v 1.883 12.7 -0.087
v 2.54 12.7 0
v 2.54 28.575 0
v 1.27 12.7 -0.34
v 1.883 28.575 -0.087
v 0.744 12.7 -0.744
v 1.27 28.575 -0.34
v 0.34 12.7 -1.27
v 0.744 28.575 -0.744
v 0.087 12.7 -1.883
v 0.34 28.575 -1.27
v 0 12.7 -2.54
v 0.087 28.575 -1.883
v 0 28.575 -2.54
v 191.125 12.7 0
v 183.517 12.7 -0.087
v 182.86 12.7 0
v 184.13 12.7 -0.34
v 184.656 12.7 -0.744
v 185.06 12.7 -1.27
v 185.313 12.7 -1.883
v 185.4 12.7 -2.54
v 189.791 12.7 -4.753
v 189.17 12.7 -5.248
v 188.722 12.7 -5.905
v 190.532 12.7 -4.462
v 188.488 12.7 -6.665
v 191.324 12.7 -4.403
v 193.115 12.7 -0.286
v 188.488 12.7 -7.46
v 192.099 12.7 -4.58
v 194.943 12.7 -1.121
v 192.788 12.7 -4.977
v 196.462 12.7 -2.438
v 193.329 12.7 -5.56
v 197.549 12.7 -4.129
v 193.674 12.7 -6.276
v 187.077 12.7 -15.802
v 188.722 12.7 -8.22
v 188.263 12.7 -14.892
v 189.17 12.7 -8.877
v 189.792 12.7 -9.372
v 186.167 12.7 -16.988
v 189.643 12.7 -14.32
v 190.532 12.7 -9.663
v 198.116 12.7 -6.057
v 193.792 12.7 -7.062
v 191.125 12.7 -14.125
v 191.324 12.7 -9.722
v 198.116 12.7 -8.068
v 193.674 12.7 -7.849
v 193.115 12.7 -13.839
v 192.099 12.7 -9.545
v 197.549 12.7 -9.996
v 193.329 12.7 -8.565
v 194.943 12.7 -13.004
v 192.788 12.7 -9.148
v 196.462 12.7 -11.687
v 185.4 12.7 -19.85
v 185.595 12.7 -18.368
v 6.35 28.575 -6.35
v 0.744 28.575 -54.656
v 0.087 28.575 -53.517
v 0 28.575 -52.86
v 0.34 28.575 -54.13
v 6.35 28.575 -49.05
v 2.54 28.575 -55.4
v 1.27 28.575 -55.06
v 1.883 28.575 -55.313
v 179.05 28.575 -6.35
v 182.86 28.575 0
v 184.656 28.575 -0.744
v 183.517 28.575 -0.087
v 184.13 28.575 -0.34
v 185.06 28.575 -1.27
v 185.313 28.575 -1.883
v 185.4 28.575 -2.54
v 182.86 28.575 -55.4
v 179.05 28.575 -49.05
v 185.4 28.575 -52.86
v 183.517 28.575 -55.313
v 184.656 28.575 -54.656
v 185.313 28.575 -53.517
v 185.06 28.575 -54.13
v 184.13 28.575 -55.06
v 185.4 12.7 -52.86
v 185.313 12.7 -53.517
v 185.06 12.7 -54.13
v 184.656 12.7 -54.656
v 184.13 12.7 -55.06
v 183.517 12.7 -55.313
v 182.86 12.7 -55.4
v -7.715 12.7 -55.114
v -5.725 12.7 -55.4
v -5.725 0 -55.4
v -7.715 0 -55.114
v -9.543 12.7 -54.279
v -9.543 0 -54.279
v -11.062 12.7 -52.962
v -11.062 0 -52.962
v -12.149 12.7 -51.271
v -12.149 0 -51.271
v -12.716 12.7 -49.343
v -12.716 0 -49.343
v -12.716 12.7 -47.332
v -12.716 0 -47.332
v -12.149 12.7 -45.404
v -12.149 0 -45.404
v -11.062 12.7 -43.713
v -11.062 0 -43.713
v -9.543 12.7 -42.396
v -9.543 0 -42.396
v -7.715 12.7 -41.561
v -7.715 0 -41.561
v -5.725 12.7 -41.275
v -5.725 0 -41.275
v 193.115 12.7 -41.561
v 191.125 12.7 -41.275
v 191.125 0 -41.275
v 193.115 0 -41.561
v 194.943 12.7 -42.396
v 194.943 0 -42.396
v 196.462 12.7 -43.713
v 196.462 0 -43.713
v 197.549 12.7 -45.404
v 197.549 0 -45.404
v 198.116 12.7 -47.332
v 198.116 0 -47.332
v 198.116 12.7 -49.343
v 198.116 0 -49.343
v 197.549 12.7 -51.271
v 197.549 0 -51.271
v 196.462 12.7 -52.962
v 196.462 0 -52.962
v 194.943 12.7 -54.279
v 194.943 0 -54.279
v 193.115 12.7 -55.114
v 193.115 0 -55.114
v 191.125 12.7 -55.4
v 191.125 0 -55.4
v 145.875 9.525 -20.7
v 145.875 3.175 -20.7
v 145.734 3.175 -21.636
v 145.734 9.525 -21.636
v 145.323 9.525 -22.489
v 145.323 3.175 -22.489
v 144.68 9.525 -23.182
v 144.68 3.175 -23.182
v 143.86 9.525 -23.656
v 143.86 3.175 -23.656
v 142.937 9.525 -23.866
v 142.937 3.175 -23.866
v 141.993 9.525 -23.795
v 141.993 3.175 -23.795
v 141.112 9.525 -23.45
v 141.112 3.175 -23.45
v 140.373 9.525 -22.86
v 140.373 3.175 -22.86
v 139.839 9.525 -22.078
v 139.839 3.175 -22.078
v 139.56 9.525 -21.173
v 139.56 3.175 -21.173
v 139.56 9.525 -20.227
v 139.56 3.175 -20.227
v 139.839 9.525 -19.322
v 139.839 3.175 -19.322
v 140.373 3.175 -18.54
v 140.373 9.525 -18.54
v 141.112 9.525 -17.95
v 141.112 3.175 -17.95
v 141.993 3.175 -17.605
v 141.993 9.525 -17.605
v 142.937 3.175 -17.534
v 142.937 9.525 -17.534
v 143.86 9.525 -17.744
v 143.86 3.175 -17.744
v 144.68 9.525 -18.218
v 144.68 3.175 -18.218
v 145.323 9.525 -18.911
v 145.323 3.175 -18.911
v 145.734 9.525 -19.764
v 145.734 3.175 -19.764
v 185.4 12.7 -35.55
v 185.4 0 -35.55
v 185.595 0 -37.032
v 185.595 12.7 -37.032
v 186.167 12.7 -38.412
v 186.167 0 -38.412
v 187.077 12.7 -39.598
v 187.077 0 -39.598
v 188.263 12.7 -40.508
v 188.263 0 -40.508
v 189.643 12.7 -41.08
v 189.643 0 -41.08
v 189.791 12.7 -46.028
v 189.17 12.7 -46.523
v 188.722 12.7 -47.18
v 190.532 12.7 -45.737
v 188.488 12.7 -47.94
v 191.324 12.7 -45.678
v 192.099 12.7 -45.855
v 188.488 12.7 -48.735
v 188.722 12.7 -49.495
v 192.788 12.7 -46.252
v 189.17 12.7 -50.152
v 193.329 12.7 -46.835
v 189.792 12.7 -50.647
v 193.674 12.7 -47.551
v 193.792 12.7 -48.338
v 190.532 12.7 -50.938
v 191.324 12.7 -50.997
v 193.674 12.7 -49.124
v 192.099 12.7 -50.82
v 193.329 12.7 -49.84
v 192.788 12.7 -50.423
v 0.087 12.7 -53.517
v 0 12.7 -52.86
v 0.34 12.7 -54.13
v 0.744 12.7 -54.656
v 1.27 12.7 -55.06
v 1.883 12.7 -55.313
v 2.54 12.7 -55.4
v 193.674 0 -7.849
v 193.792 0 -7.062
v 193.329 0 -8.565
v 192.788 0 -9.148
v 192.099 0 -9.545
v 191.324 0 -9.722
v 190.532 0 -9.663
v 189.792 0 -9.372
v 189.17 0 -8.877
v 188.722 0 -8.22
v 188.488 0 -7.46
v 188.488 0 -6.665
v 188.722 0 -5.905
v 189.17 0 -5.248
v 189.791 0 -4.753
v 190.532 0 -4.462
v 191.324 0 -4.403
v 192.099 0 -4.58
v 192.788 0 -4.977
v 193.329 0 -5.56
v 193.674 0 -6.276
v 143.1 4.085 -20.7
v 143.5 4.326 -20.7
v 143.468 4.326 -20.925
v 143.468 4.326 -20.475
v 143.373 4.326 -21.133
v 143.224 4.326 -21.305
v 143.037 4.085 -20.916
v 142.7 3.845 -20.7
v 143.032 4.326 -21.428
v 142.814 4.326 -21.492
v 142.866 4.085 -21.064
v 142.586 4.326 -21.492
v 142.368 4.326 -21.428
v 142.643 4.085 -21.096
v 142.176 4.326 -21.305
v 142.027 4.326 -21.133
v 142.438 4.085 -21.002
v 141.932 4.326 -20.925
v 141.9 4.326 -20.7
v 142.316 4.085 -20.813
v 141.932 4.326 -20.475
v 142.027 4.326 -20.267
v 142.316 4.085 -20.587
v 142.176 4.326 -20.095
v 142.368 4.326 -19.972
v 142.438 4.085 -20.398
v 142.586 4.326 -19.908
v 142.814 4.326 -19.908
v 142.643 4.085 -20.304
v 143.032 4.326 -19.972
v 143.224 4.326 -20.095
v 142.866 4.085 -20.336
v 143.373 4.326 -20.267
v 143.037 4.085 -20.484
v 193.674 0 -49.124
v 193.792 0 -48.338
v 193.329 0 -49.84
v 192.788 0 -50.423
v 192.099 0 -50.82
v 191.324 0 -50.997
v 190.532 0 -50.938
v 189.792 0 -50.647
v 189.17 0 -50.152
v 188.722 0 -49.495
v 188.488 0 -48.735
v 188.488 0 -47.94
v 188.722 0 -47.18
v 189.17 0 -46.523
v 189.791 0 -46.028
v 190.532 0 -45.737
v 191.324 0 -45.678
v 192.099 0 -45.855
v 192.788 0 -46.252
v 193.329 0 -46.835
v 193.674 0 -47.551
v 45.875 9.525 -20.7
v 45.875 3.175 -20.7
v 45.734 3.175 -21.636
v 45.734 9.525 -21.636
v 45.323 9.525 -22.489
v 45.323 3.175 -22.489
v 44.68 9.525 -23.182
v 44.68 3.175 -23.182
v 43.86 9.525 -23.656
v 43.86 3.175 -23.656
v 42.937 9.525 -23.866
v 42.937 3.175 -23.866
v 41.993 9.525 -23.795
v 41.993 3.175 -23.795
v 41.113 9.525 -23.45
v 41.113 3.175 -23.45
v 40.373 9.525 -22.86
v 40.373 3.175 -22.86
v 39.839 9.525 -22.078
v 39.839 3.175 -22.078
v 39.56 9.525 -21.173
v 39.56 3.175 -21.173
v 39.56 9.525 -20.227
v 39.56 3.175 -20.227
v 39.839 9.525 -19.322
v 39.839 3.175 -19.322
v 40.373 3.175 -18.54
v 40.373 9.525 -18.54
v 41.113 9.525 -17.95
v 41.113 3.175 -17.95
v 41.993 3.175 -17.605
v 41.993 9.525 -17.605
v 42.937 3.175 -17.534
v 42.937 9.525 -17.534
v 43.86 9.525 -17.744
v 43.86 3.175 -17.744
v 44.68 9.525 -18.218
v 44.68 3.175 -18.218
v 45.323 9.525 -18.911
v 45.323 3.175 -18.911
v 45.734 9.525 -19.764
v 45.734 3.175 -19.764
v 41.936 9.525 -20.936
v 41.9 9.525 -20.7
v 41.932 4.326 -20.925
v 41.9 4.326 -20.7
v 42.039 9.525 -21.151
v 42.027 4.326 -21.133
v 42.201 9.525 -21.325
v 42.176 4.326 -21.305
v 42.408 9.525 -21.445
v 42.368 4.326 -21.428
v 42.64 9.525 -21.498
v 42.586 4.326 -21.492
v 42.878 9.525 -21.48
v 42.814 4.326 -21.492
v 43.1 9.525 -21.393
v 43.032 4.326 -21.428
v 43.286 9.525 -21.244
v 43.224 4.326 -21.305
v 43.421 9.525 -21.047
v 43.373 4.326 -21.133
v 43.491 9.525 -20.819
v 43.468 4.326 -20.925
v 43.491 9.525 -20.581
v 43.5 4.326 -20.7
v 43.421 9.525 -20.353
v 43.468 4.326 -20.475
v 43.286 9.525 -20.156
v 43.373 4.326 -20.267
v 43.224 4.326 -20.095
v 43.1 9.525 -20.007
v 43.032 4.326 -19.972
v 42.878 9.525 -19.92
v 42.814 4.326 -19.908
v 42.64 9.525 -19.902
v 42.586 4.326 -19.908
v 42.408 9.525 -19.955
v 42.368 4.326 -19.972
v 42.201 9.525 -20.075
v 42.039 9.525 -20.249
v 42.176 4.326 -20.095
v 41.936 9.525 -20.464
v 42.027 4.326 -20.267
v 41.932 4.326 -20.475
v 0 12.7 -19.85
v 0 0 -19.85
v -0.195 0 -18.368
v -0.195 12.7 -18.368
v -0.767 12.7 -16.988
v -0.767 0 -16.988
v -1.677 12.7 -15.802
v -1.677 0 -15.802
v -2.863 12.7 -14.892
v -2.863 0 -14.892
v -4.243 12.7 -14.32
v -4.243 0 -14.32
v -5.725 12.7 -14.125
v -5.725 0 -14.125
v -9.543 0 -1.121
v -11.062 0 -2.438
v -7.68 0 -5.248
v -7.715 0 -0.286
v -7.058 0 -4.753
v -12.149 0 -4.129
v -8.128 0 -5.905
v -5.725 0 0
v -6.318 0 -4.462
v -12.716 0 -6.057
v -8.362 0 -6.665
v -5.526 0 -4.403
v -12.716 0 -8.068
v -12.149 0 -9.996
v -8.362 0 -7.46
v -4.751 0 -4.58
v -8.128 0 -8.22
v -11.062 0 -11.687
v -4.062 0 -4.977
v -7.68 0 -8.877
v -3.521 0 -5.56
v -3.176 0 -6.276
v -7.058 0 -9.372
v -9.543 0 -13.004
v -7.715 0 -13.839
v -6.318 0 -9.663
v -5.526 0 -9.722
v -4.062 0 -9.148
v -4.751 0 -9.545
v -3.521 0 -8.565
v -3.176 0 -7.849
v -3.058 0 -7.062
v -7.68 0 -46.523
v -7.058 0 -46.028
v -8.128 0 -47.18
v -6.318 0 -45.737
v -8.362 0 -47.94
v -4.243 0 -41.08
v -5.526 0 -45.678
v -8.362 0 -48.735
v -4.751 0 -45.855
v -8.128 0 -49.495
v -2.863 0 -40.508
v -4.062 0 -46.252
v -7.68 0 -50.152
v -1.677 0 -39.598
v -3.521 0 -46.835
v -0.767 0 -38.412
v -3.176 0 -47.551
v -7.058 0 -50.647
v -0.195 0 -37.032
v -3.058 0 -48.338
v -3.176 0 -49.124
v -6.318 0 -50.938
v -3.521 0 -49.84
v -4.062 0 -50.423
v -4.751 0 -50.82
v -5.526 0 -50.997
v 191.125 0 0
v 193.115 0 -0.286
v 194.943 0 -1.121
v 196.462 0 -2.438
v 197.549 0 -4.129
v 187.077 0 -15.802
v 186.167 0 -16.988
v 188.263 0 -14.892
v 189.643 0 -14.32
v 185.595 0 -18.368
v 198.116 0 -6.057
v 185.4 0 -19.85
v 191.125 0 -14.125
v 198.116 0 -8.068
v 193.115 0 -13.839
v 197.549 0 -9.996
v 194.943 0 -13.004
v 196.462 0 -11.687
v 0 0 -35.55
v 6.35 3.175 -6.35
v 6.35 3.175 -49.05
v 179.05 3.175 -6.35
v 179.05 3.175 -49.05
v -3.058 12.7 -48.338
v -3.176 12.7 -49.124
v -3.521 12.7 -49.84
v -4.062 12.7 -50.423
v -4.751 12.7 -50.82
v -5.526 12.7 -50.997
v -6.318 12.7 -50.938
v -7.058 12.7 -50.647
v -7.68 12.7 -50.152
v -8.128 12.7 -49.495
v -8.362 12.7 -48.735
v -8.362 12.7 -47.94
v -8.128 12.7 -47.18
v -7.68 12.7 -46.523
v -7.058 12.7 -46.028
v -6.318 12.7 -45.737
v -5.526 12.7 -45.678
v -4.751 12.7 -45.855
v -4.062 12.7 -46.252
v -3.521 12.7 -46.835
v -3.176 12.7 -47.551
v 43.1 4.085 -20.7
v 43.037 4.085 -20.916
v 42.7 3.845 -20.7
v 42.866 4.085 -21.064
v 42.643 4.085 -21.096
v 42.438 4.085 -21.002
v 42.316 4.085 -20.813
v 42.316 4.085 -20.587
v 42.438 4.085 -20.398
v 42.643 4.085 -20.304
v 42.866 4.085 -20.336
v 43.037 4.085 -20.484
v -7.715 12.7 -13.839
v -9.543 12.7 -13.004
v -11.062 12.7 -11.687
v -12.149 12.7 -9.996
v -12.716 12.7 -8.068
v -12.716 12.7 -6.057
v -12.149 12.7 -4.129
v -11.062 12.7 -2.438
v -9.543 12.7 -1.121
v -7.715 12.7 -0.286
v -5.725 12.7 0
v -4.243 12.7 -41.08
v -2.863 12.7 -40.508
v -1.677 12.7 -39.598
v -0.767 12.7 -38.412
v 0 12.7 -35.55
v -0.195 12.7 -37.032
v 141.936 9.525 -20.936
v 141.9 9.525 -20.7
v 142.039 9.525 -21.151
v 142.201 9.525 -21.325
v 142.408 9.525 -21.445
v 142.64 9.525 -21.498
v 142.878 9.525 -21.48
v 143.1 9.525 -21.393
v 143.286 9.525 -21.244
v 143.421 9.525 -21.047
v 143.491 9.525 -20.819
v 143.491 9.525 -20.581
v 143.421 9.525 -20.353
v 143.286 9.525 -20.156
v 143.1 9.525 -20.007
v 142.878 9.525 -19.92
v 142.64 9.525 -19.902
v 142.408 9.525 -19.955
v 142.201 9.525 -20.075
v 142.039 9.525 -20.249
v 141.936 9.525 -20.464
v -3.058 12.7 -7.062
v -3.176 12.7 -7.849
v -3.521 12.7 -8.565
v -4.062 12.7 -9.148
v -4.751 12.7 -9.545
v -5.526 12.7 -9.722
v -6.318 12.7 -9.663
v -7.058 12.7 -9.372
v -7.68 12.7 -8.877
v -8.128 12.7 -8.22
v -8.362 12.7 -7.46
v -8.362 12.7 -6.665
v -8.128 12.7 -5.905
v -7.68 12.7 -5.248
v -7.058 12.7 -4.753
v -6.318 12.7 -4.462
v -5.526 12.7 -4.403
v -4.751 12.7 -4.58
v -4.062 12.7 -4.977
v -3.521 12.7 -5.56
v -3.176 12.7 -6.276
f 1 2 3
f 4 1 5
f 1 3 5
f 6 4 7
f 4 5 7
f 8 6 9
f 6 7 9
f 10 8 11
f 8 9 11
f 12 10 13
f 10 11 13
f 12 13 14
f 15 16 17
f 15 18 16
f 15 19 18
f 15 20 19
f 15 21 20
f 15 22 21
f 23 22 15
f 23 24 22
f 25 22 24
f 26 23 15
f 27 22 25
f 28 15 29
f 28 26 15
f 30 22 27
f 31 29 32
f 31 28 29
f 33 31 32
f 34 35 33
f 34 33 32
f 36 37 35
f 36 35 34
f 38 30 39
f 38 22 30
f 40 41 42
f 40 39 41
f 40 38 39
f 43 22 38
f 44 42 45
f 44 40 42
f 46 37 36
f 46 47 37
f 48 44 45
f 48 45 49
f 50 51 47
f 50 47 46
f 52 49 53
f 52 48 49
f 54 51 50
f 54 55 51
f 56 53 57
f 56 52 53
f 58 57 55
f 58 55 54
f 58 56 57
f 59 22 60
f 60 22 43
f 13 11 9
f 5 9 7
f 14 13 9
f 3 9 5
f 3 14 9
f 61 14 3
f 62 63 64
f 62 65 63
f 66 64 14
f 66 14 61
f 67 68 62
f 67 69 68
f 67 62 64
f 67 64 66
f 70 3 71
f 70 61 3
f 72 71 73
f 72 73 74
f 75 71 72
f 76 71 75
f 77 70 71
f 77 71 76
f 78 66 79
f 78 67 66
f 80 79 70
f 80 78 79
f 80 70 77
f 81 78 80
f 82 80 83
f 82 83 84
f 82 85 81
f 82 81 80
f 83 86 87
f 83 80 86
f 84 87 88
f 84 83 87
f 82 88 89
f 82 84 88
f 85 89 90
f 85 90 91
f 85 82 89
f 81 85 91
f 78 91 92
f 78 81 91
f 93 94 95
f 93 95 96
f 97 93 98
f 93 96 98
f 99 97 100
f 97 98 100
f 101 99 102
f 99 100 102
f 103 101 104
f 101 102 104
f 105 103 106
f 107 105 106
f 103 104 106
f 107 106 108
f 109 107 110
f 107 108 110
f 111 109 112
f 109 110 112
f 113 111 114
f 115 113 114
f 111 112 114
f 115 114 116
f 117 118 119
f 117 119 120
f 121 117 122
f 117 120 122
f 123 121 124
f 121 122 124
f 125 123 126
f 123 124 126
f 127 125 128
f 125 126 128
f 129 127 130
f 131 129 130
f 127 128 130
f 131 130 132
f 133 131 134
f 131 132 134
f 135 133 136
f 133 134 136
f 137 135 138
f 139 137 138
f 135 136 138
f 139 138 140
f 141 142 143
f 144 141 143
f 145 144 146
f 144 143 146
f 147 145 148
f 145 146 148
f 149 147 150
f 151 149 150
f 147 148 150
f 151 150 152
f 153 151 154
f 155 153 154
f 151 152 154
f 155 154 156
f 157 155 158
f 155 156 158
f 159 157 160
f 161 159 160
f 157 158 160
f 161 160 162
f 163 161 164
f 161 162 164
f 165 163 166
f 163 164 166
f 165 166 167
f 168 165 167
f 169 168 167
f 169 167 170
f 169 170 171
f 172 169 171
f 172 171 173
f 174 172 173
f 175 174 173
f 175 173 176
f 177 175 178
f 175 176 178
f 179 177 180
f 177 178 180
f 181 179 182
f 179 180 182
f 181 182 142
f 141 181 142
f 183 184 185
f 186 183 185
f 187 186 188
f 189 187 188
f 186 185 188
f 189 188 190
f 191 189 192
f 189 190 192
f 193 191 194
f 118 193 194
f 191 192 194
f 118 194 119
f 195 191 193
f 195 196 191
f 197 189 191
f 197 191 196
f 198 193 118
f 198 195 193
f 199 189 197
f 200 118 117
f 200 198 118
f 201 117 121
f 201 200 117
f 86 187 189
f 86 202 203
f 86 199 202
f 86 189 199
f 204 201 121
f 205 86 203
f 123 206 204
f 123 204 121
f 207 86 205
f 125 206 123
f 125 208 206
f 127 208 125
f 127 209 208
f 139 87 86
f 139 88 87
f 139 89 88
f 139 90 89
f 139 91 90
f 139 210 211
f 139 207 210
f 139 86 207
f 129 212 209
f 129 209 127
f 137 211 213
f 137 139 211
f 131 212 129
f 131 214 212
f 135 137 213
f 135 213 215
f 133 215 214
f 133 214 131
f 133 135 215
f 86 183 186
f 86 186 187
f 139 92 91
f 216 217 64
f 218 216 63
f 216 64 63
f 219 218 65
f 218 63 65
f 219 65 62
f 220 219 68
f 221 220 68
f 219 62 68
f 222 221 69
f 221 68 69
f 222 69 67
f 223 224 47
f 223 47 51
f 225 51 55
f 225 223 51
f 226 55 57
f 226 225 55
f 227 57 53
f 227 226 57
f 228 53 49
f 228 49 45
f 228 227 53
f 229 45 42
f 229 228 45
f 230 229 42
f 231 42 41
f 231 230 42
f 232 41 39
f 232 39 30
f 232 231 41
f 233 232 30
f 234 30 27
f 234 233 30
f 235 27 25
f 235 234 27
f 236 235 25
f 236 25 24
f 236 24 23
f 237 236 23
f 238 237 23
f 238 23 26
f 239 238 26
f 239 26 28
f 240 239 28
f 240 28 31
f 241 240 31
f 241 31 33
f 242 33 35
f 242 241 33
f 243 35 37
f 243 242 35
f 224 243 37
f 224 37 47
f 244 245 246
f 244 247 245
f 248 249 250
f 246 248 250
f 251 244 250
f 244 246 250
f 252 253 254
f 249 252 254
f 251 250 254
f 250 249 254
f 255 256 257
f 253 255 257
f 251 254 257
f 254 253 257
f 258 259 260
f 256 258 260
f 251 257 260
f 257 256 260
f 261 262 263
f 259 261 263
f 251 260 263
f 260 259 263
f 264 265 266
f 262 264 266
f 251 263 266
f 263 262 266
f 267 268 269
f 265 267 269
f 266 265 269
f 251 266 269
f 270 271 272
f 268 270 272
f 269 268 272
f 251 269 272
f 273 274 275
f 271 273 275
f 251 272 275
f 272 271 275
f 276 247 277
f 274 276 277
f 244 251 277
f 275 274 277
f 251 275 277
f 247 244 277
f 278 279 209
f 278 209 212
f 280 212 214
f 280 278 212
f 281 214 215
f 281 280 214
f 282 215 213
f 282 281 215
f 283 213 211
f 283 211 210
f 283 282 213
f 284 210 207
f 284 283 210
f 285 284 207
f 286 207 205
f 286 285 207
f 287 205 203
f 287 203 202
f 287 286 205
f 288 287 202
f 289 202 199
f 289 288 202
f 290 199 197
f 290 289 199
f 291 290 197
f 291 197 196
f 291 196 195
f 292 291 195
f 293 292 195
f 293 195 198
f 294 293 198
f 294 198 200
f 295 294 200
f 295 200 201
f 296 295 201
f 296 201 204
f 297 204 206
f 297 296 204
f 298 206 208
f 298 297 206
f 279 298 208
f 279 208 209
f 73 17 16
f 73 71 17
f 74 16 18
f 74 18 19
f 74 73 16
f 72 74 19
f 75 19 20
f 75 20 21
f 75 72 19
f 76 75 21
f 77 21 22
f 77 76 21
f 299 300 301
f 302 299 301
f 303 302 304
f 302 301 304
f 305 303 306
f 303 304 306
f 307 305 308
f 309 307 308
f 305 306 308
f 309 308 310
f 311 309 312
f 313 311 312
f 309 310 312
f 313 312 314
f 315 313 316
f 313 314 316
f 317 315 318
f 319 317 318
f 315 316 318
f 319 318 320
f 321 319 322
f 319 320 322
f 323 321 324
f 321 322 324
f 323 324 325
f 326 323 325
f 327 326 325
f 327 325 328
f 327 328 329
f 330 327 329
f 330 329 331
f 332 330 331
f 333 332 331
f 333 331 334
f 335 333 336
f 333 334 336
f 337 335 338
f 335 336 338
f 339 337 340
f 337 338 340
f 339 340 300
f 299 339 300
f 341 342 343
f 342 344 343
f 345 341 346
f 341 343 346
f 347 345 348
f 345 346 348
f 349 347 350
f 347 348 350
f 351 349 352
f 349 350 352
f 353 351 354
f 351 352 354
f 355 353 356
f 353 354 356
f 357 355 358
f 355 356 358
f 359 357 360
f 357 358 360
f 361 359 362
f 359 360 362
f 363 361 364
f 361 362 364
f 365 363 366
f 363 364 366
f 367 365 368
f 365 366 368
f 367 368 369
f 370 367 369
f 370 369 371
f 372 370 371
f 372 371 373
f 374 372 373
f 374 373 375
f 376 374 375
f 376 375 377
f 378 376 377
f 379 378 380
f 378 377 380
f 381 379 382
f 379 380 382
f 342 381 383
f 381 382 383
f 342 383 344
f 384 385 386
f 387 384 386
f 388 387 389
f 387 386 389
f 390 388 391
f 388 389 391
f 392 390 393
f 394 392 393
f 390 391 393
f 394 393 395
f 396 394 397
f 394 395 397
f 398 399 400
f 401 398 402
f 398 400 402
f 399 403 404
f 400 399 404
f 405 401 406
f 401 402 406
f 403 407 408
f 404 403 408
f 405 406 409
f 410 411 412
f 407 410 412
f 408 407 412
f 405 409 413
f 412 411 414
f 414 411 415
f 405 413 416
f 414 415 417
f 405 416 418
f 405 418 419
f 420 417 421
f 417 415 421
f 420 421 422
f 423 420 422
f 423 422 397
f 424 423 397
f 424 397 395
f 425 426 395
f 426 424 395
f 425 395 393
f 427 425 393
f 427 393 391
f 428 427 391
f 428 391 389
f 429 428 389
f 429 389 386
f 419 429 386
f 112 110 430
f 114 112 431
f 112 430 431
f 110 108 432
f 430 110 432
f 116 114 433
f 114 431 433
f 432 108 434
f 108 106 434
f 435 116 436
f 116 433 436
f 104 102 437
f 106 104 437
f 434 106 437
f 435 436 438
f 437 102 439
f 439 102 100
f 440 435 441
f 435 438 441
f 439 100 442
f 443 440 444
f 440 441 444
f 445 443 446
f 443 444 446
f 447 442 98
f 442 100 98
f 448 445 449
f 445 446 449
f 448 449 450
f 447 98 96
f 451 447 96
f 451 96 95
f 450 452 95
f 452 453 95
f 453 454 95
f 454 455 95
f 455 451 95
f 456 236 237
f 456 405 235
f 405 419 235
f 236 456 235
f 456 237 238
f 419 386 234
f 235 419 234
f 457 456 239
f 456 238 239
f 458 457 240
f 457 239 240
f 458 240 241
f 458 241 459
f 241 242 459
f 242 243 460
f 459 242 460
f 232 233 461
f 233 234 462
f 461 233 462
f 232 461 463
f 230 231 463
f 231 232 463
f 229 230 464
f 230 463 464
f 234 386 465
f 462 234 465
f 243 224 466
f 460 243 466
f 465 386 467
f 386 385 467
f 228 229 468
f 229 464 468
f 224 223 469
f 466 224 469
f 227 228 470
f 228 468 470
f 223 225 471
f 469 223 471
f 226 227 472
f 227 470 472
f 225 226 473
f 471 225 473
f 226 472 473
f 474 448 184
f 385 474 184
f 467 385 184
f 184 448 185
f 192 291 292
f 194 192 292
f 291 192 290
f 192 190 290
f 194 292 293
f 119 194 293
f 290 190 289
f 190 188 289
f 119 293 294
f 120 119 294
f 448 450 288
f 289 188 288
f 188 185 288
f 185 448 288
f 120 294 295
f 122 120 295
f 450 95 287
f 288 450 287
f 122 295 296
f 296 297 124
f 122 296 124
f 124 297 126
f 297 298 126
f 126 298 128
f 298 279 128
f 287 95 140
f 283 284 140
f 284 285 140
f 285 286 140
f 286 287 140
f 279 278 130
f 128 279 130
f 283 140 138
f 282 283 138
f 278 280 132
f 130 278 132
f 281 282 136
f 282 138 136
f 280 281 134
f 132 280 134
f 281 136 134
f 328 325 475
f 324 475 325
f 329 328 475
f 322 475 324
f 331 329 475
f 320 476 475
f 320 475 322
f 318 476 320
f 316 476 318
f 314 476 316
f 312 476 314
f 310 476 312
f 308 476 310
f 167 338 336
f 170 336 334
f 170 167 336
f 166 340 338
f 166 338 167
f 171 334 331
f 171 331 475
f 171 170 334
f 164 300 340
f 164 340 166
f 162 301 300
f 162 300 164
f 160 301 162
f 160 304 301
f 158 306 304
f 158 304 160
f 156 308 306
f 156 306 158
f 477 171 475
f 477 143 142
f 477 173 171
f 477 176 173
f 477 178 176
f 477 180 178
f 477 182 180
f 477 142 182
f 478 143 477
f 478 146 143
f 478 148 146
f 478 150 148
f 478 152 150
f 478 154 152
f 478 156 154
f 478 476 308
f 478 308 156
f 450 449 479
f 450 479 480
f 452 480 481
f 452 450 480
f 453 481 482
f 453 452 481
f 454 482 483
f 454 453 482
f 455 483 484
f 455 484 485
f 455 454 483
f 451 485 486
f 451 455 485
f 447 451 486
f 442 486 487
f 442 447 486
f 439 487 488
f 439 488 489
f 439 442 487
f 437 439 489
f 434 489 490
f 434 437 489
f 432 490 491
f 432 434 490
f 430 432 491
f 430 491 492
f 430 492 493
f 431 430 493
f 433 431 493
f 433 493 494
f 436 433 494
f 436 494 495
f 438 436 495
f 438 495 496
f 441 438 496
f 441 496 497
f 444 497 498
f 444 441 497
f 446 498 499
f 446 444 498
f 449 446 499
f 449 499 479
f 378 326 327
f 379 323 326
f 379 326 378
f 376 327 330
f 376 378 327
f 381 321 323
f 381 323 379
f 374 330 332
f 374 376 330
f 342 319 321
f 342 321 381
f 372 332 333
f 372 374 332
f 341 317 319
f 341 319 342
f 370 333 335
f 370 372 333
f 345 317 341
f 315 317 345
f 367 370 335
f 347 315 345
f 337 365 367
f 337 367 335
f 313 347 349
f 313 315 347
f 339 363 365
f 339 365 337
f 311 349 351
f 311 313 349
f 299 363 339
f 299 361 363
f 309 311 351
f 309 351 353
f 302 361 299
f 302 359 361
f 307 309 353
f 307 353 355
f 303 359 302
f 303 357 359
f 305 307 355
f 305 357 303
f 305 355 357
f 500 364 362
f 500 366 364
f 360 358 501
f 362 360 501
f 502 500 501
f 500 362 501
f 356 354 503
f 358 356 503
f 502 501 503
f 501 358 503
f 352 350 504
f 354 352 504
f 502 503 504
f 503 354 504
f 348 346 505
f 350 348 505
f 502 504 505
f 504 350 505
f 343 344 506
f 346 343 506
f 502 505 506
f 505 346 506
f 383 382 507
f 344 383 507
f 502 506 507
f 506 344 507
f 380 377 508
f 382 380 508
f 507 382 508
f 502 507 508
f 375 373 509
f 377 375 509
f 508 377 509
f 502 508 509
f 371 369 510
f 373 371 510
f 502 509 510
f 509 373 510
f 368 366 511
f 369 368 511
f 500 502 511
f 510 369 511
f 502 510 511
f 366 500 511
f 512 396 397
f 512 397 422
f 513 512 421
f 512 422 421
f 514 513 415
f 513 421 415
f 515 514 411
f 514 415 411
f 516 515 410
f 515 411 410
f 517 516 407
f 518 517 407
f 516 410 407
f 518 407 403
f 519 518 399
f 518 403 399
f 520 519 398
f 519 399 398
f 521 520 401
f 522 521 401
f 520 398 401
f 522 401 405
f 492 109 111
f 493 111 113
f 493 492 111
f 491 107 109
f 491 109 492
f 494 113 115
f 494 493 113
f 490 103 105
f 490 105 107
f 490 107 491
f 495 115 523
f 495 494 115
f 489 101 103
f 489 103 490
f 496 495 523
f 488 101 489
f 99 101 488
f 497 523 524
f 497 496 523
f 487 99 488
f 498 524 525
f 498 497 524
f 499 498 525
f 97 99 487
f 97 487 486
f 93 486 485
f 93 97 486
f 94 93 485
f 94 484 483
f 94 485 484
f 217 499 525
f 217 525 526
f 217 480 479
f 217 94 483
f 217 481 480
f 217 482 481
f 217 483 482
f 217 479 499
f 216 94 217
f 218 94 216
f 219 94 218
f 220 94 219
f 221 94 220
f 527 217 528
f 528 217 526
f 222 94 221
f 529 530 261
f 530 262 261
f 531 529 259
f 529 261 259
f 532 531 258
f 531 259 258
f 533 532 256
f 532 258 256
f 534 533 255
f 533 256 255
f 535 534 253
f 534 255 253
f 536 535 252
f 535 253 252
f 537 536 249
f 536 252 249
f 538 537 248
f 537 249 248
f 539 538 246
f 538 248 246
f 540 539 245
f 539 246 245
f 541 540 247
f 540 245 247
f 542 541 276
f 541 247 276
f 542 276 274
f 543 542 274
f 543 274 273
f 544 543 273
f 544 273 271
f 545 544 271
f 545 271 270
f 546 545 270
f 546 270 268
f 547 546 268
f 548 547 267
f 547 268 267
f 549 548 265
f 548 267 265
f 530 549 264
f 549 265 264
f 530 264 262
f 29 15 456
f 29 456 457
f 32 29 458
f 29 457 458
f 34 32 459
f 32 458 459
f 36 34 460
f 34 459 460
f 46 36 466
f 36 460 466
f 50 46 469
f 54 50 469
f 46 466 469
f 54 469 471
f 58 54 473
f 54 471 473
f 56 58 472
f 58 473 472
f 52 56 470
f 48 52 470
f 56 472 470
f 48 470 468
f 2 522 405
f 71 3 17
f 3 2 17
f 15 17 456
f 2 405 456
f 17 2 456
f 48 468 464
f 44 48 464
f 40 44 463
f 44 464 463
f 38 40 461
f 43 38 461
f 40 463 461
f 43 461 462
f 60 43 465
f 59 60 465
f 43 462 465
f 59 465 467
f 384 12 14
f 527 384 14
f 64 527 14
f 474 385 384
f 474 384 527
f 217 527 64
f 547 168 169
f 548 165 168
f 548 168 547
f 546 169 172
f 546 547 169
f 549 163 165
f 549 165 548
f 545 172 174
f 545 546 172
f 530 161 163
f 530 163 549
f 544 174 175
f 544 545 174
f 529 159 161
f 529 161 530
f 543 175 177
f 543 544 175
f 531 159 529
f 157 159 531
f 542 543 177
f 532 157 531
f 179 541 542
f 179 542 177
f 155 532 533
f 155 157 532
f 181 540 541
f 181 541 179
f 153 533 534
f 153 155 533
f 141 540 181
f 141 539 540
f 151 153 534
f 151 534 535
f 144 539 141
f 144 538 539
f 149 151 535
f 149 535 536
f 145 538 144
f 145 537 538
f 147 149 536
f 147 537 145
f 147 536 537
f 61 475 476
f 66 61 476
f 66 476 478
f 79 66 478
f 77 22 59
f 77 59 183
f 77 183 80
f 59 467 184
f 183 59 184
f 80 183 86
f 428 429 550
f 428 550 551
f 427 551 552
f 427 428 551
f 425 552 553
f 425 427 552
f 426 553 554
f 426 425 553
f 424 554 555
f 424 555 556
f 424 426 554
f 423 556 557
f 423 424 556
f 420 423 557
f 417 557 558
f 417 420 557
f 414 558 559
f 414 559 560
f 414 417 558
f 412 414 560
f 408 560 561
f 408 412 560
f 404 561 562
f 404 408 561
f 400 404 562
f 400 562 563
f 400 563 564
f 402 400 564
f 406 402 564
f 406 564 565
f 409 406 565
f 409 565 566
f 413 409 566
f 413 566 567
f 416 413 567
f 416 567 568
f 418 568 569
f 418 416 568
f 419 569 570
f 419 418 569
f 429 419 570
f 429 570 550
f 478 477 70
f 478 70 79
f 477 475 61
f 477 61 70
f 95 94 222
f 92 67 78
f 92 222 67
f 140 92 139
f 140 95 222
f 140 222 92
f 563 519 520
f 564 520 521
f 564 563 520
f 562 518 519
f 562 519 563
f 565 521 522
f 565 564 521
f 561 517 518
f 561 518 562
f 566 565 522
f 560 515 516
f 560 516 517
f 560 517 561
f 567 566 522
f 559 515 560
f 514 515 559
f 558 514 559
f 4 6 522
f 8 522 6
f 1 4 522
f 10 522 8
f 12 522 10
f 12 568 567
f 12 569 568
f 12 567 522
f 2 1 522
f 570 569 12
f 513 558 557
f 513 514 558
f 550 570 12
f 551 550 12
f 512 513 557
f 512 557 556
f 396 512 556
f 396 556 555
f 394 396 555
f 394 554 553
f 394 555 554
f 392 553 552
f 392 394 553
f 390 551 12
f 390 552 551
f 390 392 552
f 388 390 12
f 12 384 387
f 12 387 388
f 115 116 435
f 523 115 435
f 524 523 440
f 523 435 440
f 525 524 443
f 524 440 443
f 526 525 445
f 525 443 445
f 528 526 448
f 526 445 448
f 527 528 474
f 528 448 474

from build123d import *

# Parameters (mm, degrees)
SKETCH1_W                 = 172.7
SKETCH1_H                 = 42.7
SKETCH1_R                 = 3.175
BOSS_EXTRUDE1_DEPTH       = 3.175
BOSS_EXTRUDE2_START       = 3.175
SKETCH1_3_R               = 3.175
BOSS_EXTRUDE2_DEPTH       = 6.35
SKETCH1_4_W               = 185.4
SKETCH1_4_H               = 55.4
SKETCH1_4_W_2             = 172.7
SKETCH1_4_H_2             = 42.7
BOSS_EXTRUDE3_DEPTH       = 28.575
SKETCH1_5_R               = 2.667
BOSS_EXTRUDE4_DEPTH       = 12.7
M2X0_4_TAPPED_HOLE1_D     = 1.6
M2X0_4_TAPPED_HOLE1_DEPTH = 5.19938
M2X0_4_TAPPED_HOLE1_TIP   = 0.480688495
FILLET1_R                 = 2.54


with BuildPart() as part:
    # Sketch1 → Boss-Extrude1 (new body)
    with BuildSketch(Plane(origin=(0, 0, 0), x_dir=(1, 0, 0), z_dir=(0, 1, 0))):
        with Locations((92.7, 27.7)):
            Rectangle(SKETCH1_W, SKETCH1_H)
        with Locations((142.7, 20.7)):
            Circle(SKETCH1_R, mode=Mode.SUBTRACT)
        with Locations((42.7, 20.7)):
            Circle(SKETCH1_R, mode=Mode.SUBTRACT)
        with Locations((42.7, 20.7)):
            Circle(SKETCH1_R)
        with Locations((142.7, 20.7)):
            Circle(SKETCH1_R)
    extrude(amount=BOSS_EXTRUDE1_DEPTH)

    # Sketch1<3> → Boss-Extrude2 (add)
    with BuildSketch(Plane(origin=(0, 0, 0), x_dir=(1, 0, 0), z_dir=(0, 1, 0)).offset(BOSS_EXTRUDE2_START)):
        with Locations((42.7, 20.7)):
            Circle(SKETCH1_3_R)
        with Locations((142.7, 20.7)):
            Circle(SKETCH1_3_R)
    extrude(amount=BOSS_EXTRUDE2_DEPTH)

    # Sketch1<4> → Boss-Extrude3 (add)
    with BuildSketch(Plane(origin=(0, 0, 0), x_dir=(1, 0, 0), z_dir=(0, 1, 0))):
        with Locations((92.7, 27.7)):
            Rectangle(SKETCH1_4_W, SKETCH1_4_H)
        with Locations((92.7, 27.7)):
            Rectangle(SKETCH1_4_W_2, SKETCH1_4_H_2, mode=Mode.SUBTRACT)
    extrude(amount=BOSS_EXTRUDE3_DEPTH)

    # Sketch1<5> → Boss-Extrude4 (add)
    with BuildSketch(Plane(origin=(0, 0, 0), x_dir=(1, 0, 0), z_dir=(0, 1, 0))):
        with BuildLine():
            Line((-5.725, 0), (0, 0))
            Line((0, 0), (0, 19.85))
            ThreePointArc((0, 19.85), (-1.676813678, 15.801813678), (-5.725, 14.125))
            ThreePointArc((-5.725, 14.125), (-12.7875, 7.0625), (-5.725, 0))
        make_face()
        with Locations((-5.725, 7.0625)):
            Circle(SKETCH1_5_R, mode=Mode.SUBTRACT)
        with BuildLine():
            ThreePointArc((-5.725, 41.275), (-1.676813678, 39.598186322), (0, 35.55))
            Line((0, 35.55), (0, 55.4))
            Line((0, 55.4), (-5.725, 55.4))
            ThreePointArc((-5.725, 55.4), (-12.7875, 48.3375), (-5.725, 41.275))
        make_face()
        with Locations((-5.725, 48.3375)):
            Circle(SKETCH1_5_R, mode=Mode.SUBTRACT)
        with BuildLine():
            Line((185.4, 19.85), (185.4, 0))
            Line((185.4, 0), (191.125, 0))
            ThreePointArc((191.125, 0), (198.1875, 7.0625), (191.125, 14.125))
            ThreePointArc((191.125, 14.125), (187.076813678, 15.801813678), (185.4, 19.85))
        make_face()
        with Locations((191.125, 7.0625)):
            Circle(SKETCH1_5_R, mode=Mode.SUBTRACT)
        with BuildLine():
            Line((185.4, 55.4), (185.4, 35.55))
            ThreePointArc((185.4, 35.55), (187.076813678, 39.598186322), (191.125, 41.275))
            ThreePointArc((191.125, 41.275), (198.1875, 48.3375), (191.125, 55.4))
            Line((191.125, 55.4), (185.4, 55.4))
        make_face()
        with Locations((191.125, 48.3375)):
            Circle(SKETCH1_5_R, mode=Mode.SUBTRACT)
    extrude(amount=BOSS_EXTRUDE4_DEPTH)

    # M2x0.4 Tapped Hole1
    with Locations(Plane(origin=(0, 9.525, 0), x_dir=(1, 0, 0), z_dir=(0, 1, 0))):
        with Locations((42.7, 20.7), (142.7, 20.7)):
            Hole(M2X0_4_TAPPED_HOLE1_D / 2, depth=M2X0_4_TAPPED_HOLE1_DEPTH)
            with Locations((0, 0, -(M2X0_4_TAPPED_HOLE1_DEPTH + M2X0_4_TAPPED_HOLE1_TIP / 2))):  # 118° drill point
                Cone(0, M2X0_4_TAPPED_HOLE1_D / 2, M2X0_4_TAPPED_HOLE1_TIP, mode=Mode.SUBTRACT)

    # Fillet1
    fillet1_edges = [part.edges().sort_by_distance(p)[0] for p in [
        (0, 20.6375, -55.4),
        (185.4, 20.6375, -55.4),
        (185.4, 20.6375, 0),
        (0, 20.6375, 0),
    ]]
    fillet(fillet1_edges, radius=FILLET1_R)


solid = part.part
